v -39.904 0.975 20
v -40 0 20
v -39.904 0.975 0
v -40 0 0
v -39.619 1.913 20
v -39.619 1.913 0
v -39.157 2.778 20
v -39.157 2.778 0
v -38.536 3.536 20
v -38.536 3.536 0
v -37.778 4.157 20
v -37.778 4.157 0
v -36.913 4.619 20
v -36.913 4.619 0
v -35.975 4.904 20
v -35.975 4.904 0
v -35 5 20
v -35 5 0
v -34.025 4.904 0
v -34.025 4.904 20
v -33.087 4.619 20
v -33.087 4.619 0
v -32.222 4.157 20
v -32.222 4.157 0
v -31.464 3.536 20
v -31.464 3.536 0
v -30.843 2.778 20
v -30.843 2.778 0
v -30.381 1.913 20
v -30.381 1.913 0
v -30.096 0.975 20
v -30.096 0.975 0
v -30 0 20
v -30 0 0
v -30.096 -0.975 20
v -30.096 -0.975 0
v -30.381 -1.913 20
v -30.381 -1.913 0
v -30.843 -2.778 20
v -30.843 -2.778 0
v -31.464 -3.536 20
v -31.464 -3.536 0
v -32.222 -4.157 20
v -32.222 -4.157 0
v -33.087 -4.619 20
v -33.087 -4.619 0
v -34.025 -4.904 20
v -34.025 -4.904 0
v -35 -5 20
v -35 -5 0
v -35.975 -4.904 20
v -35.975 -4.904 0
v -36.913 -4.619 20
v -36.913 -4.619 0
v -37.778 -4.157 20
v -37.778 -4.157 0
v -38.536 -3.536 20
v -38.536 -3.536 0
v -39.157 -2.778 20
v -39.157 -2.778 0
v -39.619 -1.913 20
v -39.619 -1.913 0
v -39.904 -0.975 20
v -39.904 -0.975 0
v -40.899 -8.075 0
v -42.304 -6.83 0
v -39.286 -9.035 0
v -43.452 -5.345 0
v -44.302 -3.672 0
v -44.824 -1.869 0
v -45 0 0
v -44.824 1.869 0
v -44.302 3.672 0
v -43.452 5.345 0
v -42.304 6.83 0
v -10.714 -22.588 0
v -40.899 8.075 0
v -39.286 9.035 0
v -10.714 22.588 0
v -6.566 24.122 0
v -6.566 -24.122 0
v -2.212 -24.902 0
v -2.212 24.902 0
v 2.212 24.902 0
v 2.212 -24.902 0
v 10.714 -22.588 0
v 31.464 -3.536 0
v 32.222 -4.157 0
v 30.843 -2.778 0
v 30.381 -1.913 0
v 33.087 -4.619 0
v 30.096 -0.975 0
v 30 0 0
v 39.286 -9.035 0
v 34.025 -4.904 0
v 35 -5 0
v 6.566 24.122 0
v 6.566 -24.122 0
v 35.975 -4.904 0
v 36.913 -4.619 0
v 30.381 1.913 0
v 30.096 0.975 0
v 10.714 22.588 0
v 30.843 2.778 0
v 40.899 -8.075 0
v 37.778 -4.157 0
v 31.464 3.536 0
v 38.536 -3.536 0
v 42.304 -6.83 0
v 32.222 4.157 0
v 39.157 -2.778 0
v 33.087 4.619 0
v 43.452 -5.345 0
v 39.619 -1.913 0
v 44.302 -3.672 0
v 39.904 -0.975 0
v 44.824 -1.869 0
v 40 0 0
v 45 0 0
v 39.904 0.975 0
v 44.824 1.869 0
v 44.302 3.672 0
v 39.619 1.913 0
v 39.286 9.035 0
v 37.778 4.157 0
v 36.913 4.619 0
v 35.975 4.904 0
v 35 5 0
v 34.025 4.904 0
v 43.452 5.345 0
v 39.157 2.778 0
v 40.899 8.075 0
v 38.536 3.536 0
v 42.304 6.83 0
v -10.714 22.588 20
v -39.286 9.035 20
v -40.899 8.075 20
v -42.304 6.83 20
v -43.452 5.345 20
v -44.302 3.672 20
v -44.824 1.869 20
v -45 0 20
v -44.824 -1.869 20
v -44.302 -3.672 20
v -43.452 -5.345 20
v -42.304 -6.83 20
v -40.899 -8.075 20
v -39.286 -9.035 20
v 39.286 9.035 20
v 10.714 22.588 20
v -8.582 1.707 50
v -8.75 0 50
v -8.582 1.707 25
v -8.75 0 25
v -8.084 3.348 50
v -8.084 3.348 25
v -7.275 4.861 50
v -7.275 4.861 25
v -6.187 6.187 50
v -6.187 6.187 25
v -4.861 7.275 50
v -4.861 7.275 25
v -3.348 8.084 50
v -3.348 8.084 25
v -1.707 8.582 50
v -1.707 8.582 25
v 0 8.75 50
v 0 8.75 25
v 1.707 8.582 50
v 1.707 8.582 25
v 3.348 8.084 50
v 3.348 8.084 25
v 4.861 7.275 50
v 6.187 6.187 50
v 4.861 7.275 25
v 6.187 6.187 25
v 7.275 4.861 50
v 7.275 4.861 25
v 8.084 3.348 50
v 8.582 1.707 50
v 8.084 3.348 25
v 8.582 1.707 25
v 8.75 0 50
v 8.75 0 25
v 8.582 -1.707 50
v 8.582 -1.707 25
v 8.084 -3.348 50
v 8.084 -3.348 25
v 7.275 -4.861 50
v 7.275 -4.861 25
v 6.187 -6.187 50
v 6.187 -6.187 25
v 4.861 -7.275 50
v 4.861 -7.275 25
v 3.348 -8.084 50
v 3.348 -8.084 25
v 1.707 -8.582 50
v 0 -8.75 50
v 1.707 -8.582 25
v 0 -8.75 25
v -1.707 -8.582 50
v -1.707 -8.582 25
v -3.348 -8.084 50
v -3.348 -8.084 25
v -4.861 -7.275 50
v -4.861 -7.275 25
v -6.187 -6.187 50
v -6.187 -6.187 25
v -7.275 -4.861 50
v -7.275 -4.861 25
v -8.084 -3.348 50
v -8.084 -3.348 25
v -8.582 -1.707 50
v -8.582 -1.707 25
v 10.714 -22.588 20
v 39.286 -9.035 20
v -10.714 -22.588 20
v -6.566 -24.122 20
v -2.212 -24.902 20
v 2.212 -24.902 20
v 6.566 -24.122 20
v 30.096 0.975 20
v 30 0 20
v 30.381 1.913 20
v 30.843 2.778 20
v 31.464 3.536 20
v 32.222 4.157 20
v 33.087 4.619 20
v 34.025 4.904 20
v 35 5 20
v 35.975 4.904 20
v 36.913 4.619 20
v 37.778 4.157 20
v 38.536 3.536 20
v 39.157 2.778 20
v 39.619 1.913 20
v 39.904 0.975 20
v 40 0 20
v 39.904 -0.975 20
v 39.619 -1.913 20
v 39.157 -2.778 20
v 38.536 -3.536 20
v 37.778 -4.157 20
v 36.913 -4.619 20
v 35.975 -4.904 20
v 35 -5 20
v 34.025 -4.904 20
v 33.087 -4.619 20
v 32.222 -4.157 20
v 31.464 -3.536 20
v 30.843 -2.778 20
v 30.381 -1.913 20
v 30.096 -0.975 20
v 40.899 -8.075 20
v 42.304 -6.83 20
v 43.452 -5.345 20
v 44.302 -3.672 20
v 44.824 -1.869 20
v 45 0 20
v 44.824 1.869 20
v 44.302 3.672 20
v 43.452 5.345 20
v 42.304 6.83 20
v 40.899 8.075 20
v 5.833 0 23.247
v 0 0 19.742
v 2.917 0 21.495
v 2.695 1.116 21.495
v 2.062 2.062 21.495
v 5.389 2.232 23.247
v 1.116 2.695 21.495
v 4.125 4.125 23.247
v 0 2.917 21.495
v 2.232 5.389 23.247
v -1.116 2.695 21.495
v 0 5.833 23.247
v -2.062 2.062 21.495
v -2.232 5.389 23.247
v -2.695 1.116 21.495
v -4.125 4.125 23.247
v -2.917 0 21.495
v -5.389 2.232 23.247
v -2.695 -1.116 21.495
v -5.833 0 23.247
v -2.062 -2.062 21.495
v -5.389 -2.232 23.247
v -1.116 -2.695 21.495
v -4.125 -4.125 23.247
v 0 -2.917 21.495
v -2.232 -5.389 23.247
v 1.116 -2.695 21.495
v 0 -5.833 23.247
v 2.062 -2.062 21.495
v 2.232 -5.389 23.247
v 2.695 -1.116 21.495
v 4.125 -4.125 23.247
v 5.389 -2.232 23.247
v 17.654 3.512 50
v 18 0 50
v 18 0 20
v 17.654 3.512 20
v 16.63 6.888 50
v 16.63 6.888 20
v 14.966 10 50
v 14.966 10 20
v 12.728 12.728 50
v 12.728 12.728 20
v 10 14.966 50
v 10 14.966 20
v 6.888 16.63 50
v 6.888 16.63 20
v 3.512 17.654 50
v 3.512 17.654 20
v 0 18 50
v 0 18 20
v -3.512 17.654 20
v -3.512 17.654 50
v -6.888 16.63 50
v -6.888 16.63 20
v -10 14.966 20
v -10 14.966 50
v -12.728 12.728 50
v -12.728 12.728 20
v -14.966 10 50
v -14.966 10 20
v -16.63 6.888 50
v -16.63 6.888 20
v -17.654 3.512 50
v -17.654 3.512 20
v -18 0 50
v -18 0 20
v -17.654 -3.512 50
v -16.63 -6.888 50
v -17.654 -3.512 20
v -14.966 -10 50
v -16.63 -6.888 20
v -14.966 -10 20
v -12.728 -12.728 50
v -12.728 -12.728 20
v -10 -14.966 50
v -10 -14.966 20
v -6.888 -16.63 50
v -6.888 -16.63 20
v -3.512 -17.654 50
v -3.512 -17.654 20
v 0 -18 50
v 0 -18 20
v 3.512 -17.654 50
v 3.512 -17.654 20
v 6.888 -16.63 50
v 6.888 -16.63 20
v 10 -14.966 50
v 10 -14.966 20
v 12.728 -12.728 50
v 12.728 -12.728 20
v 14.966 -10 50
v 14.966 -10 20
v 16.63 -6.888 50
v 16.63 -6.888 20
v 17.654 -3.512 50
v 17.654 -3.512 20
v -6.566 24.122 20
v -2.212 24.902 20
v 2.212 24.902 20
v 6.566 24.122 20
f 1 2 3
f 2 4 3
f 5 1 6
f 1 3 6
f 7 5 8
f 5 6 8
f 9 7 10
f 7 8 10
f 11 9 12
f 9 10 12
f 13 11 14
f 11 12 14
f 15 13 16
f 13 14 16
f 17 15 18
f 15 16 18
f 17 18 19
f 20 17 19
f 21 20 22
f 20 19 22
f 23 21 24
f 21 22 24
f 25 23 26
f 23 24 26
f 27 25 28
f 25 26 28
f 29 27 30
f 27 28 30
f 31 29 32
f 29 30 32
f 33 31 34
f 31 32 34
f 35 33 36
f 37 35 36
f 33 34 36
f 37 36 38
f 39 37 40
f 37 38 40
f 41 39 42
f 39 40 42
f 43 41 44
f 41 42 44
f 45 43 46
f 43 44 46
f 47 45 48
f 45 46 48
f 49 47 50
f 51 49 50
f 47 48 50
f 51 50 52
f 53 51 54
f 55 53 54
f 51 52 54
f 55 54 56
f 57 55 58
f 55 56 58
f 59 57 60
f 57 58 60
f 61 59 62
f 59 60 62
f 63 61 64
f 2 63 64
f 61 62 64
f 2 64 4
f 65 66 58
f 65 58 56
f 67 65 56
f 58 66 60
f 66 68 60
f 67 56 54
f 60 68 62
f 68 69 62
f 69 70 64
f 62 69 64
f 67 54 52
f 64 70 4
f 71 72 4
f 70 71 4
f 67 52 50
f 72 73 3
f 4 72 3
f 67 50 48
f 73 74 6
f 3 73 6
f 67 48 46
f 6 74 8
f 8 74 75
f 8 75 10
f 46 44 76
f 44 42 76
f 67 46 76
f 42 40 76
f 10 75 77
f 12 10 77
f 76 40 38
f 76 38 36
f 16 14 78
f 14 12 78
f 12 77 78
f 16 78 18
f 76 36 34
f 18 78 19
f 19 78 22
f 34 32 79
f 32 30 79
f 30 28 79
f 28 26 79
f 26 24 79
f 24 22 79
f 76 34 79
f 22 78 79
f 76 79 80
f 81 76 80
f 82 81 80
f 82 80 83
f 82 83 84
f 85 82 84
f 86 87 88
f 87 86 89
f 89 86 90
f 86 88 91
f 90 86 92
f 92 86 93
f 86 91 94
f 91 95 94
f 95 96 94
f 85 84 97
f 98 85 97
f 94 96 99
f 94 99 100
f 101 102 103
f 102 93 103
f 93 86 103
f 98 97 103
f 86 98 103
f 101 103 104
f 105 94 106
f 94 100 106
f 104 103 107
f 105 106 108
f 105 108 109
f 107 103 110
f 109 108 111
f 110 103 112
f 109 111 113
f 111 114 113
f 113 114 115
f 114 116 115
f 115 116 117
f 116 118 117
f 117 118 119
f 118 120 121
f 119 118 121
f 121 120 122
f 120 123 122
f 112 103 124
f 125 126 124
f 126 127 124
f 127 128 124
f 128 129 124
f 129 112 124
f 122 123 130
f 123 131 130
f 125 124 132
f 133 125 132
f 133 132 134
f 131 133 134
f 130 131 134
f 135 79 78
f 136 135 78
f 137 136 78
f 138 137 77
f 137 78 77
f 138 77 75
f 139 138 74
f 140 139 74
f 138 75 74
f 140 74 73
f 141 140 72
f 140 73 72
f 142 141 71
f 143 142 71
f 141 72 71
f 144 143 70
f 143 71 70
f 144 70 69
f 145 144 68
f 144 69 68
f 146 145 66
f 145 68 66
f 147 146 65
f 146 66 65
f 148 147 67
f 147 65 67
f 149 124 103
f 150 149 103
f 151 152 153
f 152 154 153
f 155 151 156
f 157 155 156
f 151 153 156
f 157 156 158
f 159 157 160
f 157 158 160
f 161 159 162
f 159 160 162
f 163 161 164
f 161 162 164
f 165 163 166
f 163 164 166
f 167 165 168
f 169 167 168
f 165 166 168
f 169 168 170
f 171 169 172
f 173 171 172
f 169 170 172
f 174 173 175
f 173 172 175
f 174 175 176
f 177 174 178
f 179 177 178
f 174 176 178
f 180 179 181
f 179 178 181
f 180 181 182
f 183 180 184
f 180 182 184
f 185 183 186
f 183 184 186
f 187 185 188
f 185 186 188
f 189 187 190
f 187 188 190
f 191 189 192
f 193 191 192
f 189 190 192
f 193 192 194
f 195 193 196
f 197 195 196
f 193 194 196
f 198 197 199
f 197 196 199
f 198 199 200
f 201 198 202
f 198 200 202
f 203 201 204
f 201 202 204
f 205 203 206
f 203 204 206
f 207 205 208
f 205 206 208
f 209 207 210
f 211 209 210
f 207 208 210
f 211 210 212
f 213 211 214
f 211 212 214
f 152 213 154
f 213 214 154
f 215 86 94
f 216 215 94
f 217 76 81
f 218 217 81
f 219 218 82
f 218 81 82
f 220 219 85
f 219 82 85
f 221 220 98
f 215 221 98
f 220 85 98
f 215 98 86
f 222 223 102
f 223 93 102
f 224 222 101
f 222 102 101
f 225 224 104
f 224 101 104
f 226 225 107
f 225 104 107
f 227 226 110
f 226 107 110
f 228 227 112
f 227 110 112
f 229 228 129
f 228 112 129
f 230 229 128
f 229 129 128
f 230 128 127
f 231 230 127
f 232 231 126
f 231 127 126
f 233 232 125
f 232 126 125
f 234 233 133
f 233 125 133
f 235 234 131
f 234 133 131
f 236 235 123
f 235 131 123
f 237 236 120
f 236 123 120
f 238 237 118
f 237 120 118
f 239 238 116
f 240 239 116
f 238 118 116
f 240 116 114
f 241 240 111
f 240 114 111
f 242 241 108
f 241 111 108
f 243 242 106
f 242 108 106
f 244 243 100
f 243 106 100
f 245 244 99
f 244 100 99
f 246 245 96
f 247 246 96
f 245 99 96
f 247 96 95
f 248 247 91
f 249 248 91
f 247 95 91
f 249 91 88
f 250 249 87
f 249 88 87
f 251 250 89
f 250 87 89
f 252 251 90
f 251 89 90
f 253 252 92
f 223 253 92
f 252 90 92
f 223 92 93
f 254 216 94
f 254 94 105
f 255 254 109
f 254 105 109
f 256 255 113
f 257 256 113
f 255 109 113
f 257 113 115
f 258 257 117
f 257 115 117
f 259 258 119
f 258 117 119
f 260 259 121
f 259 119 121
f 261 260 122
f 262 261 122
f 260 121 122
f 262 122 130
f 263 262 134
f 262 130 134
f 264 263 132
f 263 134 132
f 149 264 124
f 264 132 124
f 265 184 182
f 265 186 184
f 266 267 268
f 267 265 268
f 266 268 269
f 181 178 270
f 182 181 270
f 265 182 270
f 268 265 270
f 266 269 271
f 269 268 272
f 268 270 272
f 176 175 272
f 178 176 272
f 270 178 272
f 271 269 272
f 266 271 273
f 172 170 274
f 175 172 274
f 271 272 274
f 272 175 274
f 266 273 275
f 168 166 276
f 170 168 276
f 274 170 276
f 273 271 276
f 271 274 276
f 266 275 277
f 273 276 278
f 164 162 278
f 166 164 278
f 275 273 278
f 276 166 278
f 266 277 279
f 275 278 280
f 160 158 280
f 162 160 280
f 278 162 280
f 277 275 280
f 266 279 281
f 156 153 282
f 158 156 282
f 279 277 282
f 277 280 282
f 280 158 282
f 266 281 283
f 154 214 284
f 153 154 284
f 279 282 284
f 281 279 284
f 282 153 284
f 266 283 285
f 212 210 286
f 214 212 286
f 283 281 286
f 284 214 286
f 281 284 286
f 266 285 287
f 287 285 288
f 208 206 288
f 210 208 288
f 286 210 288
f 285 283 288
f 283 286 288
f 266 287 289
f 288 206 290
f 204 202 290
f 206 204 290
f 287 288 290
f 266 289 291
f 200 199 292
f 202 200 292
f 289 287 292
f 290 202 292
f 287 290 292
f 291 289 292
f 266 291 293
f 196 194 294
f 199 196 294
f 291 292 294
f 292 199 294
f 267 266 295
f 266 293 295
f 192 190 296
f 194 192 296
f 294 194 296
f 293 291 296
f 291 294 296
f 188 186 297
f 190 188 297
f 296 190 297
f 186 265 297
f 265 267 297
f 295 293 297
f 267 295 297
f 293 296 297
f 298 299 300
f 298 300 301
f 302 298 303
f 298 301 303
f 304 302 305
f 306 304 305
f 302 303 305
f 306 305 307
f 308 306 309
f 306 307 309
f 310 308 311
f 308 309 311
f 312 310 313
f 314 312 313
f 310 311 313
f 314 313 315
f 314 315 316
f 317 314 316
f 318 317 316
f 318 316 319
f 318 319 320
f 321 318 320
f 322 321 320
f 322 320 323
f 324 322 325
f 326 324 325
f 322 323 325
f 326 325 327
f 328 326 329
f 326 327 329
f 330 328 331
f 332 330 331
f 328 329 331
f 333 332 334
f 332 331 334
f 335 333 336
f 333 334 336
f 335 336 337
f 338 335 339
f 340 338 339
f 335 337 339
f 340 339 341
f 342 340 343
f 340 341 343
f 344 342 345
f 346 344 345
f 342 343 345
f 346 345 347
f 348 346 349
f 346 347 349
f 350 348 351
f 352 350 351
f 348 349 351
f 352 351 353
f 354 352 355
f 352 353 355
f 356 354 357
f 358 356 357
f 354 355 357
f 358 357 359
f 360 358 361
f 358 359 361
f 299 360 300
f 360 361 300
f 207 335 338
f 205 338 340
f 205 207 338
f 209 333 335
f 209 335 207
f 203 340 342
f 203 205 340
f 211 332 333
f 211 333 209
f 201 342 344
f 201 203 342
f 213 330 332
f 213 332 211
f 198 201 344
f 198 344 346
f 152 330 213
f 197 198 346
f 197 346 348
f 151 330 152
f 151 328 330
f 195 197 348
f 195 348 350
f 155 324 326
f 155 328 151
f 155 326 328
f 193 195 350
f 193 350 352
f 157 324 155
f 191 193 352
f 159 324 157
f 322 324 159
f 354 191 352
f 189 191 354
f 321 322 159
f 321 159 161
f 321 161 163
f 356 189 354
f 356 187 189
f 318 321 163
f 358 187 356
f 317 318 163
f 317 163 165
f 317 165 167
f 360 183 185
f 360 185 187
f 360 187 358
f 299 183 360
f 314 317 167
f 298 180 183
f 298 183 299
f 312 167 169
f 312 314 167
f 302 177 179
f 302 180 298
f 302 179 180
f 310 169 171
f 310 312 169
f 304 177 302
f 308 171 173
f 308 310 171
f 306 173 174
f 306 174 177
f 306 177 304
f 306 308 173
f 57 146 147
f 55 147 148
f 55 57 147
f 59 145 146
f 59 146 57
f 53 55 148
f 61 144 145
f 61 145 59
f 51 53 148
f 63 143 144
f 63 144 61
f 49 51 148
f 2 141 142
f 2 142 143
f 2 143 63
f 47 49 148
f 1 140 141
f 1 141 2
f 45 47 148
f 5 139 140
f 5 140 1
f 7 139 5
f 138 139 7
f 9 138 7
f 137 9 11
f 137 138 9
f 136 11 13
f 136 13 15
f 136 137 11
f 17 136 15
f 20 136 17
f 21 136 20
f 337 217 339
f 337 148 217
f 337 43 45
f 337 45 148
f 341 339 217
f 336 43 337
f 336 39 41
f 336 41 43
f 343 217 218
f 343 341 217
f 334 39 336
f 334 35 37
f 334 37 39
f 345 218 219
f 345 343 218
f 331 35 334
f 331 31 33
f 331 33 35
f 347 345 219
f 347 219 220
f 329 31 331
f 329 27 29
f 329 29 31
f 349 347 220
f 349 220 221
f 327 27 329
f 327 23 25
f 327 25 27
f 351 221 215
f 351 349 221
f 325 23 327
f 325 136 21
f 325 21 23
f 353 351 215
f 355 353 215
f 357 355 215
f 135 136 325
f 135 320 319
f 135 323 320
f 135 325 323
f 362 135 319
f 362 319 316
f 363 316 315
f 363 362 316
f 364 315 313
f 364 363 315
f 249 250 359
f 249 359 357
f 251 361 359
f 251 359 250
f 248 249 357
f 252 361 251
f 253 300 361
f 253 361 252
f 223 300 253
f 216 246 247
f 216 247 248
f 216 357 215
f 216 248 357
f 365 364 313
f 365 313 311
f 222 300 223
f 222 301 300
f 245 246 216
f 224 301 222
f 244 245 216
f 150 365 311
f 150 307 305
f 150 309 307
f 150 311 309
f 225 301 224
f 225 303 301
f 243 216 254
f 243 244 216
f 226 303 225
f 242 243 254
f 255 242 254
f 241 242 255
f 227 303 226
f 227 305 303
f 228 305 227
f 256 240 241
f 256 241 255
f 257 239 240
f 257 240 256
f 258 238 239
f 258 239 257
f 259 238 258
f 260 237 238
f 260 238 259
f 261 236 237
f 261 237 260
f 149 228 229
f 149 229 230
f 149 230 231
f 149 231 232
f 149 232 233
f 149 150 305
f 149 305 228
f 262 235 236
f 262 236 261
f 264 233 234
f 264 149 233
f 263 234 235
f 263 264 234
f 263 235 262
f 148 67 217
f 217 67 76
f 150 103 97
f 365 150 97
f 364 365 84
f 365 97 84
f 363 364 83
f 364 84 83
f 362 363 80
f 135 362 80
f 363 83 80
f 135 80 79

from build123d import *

# Parameters (mm, degrees)
F1_DEPTH = 20
F3_D     = 10
F3_DEPTH = 20
F3_TIP   = 3.0043030951
F4_R     = 18
F5_DEPTH = 30
F7_D     = 17.5
F7_DEPTH = 25
F7_TIP   = 5.2575304165


with BuildPart() as f1:
    # F0 (on Top) → F1 (new body)
    with BuildSketch(Plane.XY):
        with BuildLine():
            Line((10.714285677, -22.587697541), (39.2857142338, -9.0350790325))
            ThreePointArc((39.2857142338, -9.0350790325), (44.9999999554, 0), (39.2857142338, 9.0350790325))
            Line((39.2857142338, 9.0350790325), (10.714285677, 22.587697541))
            ThreePointArc((10.714285677, 22.587697541), (2.52e-08, 24.9999999554), (-10.7142856314, 22.5876975626))
            Line((-10.7142856314, 22.5876975626), (-39.2857142793, 9.0350790815))
            ThreePointArc((-39.2857142793, 9.0350790815), (-45.0000000446, 0), (-39.2857142793, -9.0350790815))
            Line((-39.2857142793, -9.0350790815), (-10.7142856314, -22.5876975626))
            ThreePointArc((-10.7142856314, -22.5876975626), (2.52e-08, -24.9999999554), (10.714285677, -22.587697541))
        make_face()
    extrude(amount=F1_DEPTH)

    # F3
    with Locations(Plane.XY.offset(20)):
        with Locations((-35, 0), (35, 0)):
            Hole(F3_D / 2, depth=F3_DEPTH)
            with Locations((0, 0, -(F3_DEPTH + F3_TIP / 2))):  # 118° drill point
                Cone(0, F3_D / 2, F3_TIP, mode=Mode.SUBTRACT)

    # F4 (on face) → F5 (join)
    with BuildSketch(Plane.XY.offset(20)):
        Circle(F4_R)
    extrude(amount=F5_DEPTH)

    # F7
    with Locations(Plane.XY.offset(50)):
        with Locations((0, 0)):
            Hole(F7_D / 2, depth=F7_DEPTH)
            with Locations((0, 0, -(F7_DEPTH + F7_TIP / 2))):  # 118° drill point
                Cone(0, F7_D / 2, F7_TIP, mode=Mode.SUBTRACT)


solid = f1.part
